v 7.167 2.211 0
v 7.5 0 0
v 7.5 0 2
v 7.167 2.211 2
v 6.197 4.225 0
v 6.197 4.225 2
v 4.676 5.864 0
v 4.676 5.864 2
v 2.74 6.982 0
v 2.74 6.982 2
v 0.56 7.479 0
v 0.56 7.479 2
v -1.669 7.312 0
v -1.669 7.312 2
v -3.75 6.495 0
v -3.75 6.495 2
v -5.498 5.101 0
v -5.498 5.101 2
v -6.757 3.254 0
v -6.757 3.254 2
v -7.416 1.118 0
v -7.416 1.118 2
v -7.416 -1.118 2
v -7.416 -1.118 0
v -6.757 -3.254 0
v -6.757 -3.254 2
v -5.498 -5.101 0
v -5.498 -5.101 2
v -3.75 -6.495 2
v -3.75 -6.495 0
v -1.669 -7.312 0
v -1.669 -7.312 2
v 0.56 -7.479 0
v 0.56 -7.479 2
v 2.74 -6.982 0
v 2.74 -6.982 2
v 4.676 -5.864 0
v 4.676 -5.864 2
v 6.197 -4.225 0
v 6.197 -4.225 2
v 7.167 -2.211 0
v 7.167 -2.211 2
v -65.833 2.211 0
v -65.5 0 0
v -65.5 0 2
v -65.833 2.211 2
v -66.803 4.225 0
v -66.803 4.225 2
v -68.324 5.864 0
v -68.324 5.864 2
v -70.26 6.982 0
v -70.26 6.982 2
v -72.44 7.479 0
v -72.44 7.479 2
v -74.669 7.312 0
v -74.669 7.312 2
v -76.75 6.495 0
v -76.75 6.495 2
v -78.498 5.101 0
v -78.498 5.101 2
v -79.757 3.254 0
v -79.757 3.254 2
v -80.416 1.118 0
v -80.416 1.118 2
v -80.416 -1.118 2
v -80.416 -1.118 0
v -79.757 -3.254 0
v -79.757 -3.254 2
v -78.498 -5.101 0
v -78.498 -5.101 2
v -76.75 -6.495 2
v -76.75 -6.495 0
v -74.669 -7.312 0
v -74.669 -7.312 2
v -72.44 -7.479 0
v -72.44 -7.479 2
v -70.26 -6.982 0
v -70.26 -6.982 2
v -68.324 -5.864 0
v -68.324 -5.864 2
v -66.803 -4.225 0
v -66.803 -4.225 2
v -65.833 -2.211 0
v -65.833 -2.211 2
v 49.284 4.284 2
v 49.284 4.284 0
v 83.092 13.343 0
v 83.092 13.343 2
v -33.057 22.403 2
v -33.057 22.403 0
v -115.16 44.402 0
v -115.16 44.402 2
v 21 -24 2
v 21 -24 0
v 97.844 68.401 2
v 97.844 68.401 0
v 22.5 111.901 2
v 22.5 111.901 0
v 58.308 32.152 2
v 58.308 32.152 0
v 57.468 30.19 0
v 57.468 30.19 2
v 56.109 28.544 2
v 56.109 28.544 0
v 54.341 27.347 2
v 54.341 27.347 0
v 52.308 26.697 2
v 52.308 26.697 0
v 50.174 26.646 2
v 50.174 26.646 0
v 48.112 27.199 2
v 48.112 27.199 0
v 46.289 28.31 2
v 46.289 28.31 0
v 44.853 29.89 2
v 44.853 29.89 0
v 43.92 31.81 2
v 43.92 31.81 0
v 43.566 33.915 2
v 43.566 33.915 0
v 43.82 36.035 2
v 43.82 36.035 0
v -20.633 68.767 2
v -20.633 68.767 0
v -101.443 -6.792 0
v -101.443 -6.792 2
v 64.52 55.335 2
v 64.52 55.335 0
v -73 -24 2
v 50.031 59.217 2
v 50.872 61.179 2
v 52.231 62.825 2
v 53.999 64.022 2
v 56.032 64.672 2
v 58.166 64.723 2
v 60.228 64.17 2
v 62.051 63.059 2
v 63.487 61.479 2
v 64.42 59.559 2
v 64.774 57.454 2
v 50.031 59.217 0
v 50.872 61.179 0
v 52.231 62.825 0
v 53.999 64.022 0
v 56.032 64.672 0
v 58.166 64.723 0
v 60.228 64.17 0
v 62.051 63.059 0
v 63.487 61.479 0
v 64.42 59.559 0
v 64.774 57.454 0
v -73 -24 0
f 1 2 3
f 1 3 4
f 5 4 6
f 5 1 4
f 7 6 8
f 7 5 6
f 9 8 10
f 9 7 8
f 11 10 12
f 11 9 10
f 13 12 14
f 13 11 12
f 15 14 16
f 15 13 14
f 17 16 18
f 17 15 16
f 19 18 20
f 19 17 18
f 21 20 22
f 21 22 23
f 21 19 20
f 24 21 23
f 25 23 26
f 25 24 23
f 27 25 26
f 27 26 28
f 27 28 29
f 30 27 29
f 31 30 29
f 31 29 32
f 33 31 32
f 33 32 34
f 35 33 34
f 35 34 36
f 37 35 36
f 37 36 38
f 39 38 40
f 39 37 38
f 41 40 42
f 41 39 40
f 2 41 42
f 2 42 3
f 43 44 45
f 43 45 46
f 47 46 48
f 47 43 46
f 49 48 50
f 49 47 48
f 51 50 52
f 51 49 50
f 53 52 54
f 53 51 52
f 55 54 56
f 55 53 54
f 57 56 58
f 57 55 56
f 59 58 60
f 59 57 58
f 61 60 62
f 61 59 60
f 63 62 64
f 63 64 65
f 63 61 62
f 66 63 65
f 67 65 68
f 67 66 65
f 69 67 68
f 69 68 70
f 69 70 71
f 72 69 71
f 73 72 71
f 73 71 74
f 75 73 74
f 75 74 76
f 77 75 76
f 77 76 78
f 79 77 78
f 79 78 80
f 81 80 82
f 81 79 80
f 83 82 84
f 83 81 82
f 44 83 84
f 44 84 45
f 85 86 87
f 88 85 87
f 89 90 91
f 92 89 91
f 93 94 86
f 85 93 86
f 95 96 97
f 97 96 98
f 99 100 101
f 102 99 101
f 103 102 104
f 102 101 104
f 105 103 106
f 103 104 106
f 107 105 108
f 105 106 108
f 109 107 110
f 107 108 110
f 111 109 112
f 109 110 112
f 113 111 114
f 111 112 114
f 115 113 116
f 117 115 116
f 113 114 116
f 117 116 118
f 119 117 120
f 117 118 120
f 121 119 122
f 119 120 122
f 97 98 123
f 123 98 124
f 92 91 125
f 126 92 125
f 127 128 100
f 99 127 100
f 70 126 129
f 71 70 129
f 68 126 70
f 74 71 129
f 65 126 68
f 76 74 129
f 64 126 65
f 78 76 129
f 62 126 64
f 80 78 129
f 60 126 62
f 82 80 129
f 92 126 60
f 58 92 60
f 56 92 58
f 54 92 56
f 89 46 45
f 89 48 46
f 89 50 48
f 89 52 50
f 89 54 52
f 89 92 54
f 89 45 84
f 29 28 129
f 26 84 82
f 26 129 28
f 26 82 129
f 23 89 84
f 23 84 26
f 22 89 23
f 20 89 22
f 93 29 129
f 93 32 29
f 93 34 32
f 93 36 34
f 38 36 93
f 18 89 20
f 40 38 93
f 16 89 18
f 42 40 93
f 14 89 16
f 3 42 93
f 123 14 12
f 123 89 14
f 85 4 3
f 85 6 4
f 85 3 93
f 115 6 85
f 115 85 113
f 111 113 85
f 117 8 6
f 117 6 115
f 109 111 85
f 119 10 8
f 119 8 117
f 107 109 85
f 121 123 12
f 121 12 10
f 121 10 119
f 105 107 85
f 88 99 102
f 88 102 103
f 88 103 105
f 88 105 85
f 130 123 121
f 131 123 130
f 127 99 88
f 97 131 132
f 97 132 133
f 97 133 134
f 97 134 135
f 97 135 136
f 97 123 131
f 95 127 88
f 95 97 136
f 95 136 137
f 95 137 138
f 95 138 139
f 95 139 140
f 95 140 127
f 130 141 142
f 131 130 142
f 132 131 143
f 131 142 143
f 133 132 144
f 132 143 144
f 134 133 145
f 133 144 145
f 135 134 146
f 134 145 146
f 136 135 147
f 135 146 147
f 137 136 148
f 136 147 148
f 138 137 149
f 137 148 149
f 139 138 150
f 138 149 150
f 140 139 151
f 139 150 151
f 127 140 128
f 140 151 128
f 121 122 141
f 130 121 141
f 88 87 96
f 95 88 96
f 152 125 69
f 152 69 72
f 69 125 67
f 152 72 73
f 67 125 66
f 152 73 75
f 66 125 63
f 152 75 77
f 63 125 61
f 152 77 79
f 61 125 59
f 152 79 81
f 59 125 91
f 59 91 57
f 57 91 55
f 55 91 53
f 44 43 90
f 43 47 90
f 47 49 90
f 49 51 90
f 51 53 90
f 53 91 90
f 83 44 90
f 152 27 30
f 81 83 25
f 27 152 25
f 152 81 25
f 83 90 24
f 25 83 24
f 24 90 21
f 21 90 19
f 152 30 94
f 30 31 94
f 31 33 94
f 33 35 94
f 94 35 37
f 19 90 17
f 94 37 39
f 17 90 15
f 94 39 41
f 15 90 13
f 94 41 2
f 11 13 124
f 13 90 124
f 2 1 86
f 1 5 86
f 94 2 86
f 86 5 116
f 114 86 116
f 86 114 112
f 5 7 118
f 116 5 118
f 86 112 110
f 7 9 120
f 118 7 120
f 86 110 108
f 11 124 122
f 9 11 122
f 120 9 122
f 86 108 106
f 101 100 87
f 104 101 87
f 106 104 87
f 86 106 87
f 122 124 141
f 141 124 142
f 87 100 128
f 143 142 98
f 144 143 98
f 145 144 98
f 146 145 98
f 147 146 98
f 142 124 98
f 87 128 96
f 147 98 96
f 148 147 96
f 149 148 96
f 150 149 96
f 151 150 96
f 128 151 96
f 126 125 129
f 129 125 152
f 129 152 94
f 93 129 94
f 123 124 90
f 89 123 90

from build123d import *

# Parameters (mm, degrees)
SKETCH1_R           = 7.5
BOSS_EXTRUDE1_DEPTH = 2


with BuildPart() as part:
    # Sketch1 → Boss-Extrude1 (new body)
    with BuildSketch(Plane.XY):
        Polygon((-73, -24), (21, -24), (49.284271247, 4.284271247), (83.091675168, 13.342937826), (97.844360738, 68.400709925), (22.500150609, 111.900709925), (-20.633363043, 68.767196272), (-33.056677208, 22.40275661), (-115.160372443, 44.402375444), (-101.442963052, -6.791693349), align=None)
        Circle(SKETCH1_R, mode=Mode.SUBTRACT)
        with Locations((-73, 0)):
            Circle(SKETCH1_R, mode=Mode.SUBTRACT)
        with BuildLine():
            Line((64.520092973, 55.334506438), (58.308435891, 32.152286607))
            ThreePointArc((58.308435891, 32.152286607), (49.122849355, 26.848985748), (43.819548496, 36.034572283))
            Line((43.819548496, 36.034572283), (50.031205579, 59.216792114))
            ThreePointArc((50.031205579, 59.216792114), (59.216792114, 64.520092973), (64.520092973, 55.334506438))
        make_face(mode=Mode.SUBTRACT)
    extrude(amount=BOSS_EXTRUDE1_DEPTH)


solid = part.part
